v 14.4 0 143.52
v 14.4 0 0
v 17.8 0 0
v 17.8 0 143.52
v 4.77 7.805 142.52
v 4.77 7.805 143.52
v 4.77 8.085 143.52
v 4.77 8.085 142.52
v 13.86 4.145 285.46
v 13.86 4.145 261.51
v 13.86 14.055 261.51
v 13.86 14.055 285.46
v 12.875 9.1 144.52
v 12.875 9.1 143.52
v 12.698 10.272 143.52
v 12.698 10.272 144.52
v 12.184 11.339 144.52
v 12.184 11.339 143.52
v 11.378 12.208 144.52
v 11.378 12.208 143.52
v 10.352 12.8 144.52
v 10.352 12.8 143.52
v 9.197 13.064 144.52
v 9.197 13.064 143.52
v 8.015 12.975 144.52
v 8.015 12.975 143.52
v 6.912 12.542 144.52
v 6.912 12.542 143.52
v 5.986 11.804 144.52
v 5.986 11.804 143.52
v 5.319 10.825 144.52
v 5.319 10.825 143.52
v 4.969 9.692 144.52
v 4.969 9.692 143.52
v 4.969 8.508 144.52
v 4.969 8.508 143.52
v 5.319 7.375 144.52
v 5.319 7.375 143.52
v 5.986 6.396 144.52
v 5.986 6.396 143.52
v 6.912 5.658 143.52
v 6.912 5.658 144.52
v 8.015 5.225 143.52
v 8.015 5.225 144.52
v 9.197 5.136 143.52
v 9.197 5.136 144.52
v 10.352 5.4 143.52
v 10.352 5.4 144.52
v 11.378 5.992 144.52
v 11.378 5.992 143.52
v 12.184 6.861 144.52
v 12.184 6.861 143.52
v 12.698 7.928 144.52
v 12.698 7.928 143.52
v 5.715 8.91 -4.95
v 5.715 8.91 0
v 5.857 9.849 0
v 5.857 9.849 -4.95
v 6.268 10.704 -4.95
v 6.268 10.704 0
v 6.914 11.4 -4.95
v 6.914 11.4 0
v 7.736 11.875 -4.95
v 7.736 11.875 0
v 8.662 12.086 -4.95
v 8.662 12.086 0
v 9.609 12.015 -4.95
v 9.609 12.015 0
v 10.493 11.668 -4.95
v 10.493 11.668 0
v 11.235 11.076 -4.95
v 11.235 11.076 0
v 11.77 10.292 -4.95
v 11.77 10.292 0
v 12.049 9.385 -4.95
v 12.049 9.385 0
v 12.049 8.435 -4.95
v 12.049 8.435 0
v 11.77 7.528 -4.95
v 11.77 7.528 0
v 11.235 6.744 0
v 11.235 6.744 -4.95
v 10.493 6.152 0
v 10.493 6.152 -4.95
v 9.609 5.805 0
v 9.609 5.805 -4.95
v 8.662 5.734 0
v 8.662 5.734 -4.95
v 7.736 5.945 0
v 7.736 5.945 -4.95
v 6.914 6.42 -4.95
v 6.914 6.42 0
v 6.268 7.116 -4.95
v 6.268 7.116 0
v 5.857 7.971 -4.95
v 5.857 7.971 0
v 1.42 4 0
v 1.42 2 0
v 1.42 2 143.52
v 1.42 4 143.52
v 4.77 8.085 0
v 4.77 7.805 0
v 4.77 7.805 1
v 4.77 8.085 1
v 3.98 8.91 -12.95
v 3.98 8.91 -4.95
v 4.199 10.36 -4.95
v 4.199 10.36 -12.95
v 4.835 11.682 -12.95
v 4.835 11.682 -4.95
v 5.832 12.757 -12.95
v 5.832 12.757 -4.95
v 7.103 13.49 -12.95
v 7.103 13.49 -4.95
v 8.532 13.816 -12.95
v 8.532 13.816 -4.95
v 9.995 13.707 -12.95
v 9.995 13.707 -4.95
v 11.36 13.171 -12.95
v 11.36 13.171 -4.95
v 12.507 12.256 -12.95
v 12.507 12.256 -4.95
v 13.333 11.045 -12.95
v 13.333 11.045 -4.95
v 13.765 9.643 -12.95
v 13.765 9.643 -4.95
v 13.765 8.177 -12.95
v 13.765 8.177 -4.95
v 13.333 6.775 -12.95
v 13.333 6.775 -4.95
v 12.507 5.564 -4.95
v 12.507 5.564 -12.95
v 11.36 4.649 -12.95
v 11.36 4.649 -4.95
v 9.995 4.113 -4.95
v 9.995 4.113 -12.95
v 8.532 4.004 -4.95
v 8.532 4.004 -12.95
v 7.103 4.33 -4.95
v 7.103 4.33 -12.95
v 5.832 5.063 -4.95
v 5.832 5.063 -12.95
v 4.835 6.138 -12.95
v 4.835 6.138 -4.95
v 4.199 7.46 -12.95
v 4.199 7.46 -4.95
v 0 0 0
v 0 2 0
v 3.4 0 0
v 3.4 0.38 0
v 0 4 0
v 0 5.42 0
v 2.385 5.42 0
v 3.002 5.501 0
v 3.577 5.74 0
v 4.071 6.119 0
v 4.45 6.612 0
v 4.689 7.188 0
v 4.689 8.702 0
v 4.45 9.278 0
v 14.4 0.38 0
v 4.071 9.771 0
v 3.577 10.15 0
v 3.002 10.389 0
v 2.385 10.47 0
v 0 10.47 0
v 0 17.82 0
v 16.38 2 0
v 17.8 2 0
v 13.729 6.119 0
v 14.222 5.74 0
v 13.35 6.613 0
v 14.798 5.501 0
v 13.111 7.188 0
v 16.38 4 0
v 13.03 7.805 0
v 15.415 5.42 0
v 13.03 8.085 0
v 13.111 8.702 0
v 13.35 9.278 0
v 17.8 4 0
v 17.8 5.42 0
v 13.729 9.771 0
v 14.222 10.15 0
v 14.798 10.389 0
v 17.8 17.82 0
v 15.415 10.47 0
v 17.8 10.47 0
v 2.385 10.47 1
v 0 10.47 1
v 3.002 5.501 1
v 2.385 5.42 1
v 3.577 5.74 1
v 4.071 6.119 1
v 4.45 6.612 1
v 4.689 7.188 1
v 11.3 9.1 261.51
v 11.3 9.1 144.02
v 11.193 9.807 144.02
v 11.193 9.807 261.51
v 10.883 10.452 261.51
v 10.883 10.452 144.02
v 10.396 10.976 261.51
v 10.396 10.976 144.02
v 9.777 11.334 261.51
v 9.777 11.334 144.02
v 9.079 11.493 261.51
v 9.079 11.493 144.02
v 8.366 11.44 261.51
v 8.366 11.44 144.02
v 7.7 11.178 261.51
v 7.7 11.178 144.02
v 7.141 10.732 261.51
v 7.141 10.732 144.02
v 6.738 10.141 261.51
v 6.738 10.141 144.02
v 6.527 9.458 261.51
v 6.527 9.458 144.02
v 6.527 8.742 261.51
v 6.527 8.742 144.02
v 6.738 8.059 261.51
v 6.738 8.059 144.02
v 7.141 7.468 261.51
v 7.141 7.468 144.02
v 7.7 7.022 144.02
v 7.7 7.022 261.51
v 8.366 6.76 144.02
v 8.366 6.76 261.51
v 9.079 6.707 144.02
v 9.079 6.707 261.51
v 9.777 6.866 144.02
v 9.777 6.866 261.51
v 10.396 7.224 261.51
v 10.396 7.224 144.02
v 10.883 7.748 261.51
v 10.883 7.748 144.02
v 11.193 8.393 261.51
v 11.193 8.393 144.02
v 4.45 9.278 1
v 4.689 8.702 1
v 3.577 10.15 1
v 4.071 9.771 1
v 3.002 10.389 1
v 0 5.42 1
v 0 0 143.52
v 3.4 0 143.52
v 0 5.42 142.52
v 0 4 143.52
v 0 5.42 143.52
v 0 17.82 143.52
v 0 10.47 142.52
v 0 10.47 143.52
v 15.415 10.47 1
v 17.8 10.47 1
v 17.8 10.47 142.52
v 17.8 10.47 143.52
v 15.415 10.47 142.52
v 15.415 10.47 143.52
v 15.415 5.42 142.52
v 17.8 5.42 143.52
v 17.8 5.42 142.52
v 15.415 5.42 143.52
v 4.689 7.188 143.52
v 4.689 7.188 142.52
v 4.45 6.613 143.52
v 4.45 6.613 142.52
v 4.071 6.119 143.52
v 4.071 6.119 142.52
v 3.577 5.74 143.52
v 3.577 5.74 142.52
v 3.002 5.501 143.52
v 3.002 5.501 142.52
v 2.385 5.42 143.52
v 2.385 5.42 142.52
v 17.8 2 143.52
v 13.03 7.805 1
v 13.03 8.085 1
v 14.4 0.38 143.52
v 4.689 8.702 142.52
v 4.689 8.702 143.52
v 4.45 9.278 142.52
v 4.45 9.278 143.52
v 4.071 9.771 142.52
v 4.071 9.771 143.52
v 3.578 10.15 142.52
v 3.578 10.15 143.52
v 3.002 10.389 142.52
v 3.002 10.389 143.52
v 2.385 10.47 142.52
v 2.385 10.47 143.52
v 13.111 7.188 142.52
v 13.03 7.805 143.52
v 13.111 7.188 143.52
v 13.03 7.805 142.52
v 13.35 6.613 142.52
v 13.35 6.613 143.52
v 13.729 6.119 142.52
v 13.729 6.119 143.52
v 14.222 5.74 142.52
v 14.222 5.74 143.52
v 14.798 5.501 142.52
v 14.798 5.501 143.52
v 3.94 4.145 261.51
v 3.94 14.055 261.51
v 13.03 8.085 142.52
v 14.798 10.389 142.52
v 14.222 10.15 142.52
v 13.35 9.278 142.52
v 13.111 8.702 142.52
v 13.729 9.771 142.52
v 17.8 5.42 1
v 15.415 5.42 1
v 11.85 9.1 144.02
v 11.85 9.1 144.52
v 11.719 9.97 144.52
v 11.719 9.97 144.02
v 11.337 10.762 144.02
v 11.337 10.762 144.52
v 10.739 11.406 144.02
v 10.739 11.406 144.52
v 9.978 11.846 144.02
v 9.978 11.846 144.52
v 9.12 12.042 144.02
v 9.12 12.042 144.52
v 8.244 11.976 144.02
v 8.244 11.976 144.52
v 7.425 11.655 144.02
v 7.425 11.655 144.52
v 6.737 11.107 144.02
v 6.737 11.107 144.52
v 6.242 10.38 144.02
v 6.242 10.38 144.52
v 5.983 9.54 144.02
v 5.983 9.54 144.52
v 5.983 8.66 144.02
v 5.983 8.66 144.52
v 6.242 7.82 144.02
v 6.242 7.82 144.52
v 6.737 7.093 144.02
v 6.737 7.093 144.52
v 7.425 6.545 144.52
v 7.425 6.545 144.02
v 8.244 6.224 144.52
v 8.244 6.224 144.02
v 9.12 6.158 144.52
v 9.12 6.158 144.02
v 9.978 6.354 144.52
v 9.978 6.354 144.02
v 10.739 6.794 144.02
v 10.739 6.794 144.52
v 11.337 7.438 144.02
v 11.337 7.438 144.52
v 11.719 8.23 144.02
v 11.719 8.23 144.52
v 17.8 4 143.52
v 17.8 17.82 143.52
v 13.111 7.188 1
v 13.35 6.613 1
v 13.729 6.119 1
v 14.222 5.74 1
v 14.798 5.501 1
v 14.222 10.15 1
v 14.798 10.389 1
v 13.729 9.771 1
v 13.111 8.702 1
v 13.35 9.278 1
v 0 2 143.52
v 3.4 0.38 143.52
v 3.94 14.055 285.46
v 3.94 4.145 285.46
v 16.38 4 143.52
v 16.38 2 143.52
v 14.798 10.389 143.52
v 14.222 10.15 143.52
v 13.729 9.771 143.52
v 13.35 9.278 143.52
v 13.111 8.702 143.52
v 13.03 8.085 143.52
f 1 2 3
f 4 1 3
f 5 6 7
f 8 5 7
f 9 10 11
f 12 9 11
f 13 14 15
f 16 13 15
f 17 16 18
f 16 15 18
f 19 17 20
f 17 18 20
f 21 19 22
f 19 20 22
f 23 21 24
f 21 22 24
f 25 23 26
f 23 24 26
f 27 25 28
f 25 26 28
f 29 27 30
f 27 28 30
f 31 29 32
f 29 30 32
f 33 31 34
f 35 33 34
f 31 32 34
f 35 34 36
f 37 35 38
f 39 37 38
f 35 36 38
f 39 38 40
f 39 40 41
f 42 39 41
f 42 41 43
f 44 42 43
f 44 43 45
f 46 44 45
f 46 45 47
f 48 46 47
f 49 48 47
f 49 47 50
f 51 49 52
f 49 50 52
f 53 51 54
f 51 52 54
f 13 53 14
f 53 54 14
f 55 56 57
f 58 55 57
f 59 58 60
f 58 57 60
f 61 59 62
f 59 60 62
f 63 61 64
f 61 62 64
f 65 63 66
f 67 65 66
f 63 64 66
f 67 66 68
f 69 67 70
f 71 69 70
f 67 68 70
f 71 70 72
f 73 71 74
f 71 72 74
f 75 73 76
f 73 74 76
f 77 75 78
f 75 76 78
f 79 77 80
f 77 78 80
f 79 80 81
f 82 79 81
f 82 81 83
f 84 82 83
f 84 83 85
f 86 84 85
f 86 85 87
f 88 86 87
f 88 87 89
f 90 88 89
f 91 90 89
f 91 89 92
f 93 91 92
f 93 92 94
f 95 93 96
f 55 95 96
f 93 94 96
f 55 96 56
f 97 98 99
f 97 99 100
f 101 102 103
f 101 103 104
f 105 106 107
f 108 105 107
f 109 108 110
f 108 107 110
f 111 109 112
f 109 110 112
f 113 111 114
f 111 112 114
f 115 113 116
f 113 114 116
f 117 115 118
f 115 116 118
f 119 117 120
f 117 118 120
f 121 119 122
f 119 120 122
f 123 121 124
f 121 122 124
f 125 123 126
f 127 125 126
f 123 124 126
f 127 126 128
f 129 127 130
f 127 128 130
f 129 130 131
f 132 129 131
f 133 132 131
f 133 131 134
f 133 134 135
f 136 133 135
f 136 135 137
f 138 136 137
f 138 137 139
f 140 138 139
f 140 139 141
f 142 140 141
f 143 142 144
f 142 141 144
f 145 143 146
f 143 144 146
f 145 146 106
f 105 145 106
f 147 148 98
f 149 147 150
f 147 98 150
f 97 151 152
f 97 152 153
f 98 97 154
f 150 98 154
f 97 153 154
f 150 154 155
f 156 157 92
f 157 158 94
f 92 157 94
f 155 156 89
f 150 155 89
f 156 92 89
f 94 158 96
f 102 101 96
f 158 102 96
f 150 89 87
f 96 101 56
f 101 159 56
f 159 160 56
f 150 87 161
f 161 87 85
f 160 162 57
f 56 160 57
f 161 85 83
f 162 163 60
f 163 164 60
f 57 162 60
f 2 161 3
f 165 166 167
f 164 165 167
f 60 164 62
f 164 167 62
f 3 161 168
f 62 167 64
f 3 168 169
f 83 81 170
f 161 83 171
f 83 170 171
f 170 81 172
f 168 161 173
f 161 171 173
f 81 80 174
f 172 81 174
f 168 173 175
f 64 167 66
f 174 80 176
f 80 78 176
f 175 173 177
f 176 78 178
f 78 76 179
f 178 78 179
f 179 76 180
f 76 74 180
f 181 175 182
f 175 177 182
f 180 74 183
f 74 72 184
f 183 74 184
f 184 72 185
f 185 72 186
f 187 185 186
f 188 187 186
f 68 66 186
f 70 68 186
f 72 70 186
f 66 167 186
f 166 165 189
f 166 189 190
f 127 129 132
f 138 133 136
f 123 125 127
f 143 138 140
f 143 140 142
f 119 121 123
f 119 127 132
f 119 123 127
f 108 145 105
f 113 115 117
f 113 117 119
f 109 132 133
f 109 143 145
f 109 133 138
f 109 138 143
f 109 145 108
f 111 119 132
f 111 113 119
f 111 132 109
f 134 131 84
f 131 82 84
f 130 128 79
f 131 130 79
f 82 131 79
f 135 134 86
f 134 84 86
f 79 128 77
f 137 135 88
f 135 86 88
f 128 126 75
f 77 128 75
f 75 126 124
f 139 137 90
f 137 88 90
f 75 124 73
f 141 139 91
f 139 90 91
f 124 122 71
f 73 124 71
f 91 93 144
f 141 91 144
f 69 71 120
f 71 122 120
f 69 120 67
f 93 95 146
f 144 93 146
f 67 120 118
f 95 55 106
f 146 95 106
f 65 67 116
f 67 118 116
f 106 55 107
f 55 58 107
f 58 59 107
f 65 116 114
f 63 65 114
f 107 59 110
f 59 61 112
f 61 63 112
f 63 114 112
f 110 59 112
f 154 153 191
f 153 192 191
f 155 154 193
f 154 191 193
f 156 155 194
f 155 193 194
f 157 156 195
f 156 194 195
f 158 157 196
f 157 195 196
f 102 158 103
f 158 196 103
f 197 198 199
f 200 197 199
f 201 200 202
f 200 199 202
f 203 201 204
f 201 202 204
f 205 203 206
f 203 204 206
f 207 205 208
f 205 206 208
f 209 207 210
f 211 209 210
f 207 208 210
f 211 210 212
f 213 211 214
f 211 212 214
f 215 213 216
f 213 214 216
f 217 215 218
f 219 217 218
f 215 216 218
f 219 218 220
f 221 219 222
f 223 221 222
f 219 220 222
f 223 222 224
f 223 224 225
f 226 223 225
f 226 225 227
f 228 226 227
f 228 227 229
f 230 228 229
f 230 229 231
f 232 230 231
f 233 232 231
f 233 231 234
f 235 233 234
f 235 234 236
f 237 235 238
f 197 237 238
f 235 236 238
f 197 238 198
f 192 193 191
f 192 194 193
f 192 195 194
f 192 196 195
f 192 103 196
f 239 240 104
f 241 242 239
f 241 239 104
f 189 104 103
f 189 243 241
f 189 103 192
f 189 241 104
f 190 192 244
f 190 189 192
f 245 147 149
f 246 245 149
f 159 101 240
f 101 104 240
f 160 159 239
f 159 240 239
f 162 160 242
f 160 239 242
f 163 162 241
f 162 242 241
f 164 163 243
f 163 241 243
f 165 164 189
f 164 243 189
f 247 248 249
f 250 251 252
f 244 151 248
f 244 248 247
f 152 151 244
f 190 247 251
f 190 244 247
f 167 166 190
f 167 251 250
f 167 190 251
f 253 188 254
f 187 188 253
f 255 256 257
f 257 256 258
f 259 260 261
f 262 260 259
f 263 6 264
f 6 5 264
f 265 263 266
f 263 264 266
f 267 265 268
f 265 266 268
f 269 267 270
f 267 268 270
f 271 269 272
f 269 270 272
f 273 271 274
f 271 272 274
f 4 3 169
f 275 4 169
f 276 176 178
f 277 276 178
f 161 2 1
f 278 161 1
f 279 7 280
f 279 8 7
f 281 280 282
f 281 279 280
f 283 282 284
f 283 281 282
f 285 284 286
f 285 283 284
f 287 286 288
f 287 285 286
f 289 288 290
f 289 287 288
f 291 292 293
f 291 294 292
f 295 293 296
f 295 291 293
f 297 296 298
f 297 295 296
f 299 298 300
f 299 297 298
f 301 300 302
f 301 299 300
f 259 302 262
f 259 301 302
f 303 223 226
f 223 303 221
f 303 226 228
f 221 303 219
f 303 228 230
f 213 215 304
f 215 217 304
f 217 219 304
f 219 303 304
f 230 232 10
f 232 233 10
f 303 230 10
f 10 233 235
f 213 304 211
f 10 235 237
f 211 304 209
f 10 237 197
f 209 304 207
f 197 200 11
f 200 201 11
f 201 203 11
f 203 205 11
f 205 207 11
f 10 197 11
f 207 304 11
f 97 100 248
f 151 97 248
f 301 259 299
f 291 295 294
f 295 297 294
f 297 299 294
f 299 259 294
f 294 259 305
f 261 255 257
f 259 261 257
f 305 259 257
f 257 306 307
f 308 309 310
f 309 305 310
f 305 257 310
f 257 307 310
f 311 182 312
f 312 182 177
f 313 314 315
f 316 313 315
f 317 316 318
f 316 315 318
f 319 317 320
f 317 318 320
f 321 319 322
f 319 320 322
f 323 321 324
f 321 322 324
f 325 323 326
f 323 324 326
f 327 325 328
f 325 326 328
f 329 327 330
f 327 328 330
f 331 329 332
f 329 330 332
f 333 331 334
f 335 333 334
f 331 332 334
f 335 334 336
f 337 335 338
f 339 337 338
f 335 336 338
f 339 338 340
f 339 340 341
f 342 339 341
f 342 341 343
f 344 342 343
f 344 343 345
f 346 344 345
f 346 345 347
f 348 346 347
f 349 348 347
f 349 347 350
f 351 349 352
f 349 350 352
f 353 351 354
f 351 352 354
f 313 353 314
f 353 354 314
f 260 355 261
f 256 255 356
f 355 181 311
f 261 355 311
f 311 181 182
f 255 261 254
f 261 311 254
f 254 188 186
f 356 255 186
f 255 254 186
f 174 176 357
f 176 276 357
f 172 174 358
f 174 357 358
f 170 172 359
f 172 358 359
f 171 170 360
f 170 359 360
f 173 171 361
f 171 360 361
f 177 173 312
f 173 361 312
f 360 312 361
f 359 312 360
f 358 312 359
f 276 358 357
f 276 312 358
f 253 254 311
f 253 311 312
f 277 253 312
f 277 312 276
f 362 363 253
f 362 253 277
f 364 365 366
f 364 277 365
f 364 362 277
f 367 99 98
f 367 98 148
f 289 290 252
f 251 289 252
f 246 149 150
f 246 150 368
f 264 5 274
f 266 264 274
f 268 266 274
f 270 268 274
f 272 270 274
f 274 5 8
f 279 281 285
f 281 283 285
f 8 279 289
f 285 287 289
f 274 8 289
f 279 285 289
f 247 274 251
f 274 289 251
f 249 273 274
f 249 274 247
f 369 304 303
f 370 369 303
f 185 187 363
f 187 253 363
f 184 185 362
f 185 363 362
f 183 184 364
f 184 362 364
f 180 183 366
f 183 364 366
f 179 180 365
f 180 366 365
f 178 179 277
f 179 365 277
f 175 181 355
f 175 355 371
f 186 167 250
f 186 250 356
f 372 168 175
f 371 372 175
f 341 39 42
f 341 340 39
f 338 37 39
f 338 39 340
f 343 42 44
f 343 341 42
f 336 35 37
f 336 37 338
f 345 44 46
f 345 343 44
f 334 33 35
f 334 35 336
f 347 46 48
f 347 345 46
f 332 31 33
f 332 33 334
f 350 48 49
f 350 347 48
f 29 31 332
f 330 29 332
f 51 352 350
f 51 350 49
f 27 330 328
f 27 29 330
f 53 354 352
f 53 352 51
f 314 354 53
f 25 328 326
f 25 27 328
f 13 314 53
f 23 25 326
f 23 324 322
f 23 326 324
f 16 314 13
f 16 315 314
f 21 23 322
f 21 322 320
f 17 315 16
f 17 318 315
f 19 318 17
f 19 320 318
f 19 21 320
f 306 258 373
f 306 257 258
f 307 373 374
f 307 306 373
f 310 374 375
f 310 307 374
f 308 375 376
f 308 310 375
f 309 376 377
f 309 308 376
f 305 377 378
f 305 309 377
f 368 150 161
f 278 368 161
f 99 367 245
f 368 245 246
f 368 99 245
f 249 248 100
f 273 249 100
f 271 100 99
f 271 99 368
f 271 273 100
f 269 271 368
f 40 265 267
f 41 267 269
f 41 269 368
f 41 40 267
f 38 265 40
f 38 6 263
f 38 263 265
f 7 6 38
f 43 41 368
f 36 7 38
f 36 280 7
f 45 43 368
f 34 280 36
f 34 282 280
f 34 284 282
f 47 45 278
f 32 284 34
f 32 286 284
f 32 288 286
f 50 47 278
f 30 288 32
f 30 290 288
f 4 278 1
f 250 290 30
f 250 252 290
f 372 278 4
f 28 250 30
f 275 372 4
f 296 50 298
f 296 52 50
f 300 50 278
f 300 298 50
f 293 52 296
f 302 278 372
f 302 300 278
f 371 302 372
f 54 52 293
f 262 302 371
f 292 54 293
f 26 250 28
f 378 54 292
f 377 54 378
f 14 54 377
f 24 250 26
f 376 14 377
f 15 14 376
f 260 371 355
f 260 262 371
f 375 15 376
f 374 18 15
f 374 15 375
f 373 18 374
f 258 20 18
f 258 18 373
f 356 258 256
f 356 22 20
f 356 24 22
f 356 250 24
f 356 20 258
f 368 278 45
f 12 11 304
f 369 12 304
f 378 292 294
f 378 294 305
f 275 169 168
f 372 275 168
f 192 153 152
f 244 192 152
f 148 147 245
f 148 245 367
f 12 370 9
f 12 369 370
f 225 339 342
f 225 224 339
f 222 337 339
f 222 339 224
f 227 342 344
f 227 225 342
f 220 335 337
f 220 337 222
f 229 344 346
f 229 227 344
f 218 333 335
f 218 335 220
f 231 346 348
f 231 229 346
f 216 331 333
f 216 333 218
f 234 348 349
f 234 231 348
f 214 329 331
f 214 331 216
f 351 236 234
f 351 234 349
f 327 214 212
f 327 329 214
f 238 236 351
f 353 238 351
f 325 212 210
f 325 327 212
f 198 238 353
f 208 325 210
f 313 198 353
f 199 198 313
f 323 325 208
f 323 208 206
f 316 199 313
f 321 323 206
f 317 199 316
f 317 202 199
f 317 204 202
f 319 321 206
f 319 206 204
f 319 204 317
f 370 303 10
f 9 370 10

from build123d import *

# Parameters (mm, degrees)
CROQUIS1_W              = 17.8
CROQUIS1_H              = 17.82
SALIENTE_EXTRUIR1_DEPTH = 143.52
CROQUIS2_W              = 11
CROQUIS2_H              = 143.52
CORTAR_EXTRUIR1_DEPTH   = 0.38
CROQUIS3_W              = 1.42
CROQUIS3_H              = 2
CORTAR_EXTRUIR2_DEPTH   = 144.52
CROQUIS4_W              = 4.77
CROQUIS4_H              = 5.05
CORTAR_EXTRUIR3_DEPTH   = 1
CORTAR_EXTRUIR4_START   = -142.52
CROQUIS5_W              = 4.77
CROQUIS5_H              = 5.05
CORTAR_EXTRUIR4_DEPTH   = 1
REDONDEO1_R             = 2.385
REDONDEO2_R             = 2.385
REDONDEO3_R             = 2.385
REDONDEO4_R             = 2.385
REDONDEO5_R             = 2.385
REDONDEO6_R             = 2.385
REDONDEO7_R             = 2.385
REDONDEO8_R             = 2.385
CROQUIS6_R              = 3.975
SALIENTE_EXTRUIR2_DEPTH = 1
CROQUIS7_R              = 2.95
CORTAR_EXTRUIR5_DEPTH   = 0.5
CROQUIS8_R              = 2.4
SALIENTE_EXTRUIR3_DEPTH = 117.49
SALIENTE_EXTRUIR4_DEPTH = 23.95
CROQUIS10_R             = 3.185
SALIENTE_EXTRUIR5_DEPTH = 4.95
CROQUIS15_R             = 4.92
SALIENTE_EXTRUIR6_DEPTH = 8


with BuildPart() as part:
    # Croquis1 → Saliente-Extruir1 (new body)
    with BuildSketch(Plane.XY):
        with Locations((8.9, 8.91)):
            Rectangle(CROQUIS1_W, CROQUIS1_H)
    extrude(amount=SALIENTE_EXTRUIR1_DEPTH)

    # Croquis2 → Cortar-Extruir1 (cut)
    with BuildSketch(Plane.XZ):
        with Locations((8.9, 71.76)):
            Rectangle(CROQUIS2_W, CROQUIS2_H)
    extrude(amount=-CORTAR_EXTRUIR1_DEPTH, mode=Mode.SUBTRACT)

    # Croquis3 → Cortar-Extruir2 (cut, through all)
    with BuildSketch(Plane(origin=(0, 0, 0), x_dir=(-1, 0, 0), z_dir=(0, 0, -1))):
        with Locations((-17.09, 3)):
            Rectangle(CROQUIS3_W, CROQUIS3_H)
        with Locations((-0.71, 3)):
            Rectangle(CROQUIS3_W, CROQUIS3_H)
    extrude(amount=-CORTAR_EXTRUIR2_DEPTH, mode=Mode.SUBTRACT)

    # Croquis4 → Cortar-Extruir3 (cut)
    with BuildSketch(Plane(origin=(0, 0, 0), x_dir=(-1, 0, 0), z_dir=(0, 0, -1))):
        with Locations((-2.385, 7.945)):
            Rectangle(CROQUIS4_W, CROQUIS4_H)
        with Locations((-15.415, 7.945)):
            Rectangle(CROQUIS4_W, CROQUIS4_H)
    extrude(amount=-CORTAR_EXTRUIR3_DEPTH, mode=Mode.SUBTRACT)

    # Croquis5 → Cortar-Extruir4 (cut)
    with BuildSketch(Plane(origin=(0, 0, 1), x_dir=(-1, 0, 0), z_dir=(0, 0, -1)).offset(CORTAR_EXTRUIR4_START)):
        with Locations((-15.415, 7.945)):
            Rectangle(CROQUIS5_W, CROQUIS5_H)
        with Locations((-2.385, 7.945)):
            Rectangle(CROQUIS5_W, CROQUIS5_H)
    extrude(amount=CORTAR_EXTRUIR4_DEPTH, mode=Mode.SUBTRACT)

    # Redondeo1
    redondeo1_edges = [part.edges().sort_by_distance(p)[0] for p in [
        (4.77, 5.42, 0.5),
    ]]
    fillet(redondeo1_edges, radius=REDONDEO1_R)

    # Redondeo2
    redondeo2_edges = [part.edges().sort_by_distance(p)[0] for p in [
        (4.77, 10.47, 0.5),
    ]]
    fillet(redondeo2_edges, radius=REDONDEO2_R)

    # Redondeo3
    redondeo3_edges = [part.edges().sort_by_distance(p)[0] for p in [
        (13.03, 10.47, 0.5),
    ]]
    fillet(redondeo3_edges, radius=REDONDEO3_R)

    # Redondeo4
    redondeo4_edges = [part.edges().sort_by_distance(p)[0] for p in [
        (13.03, 5.42, 0.5),
    ]]
    fillet(redondeo4_edges, radius=REDONDEO4_R)

    # Redondeo5
    redondeo5_edges = [part.edges().sort_by_distance(p)[0] for p in [
        (13.03, 10.47, 143.02),
    ]]
    fillet(redondeo5_edges, radius=REDONDEO5_R)

    # Redondeo6
    redondeo6_edges = [part.edges().sort_by_distance(p)[0] for p in [
        (13.03, 5.42, 143.02),
    ]]
    fillet(redondeo6_edges, radius=REDONDEO6_R)

    # Redondeo7
    redondeo7_edges = [part.edges().sort_by_distance(p)[0] for p in [
        (4.77, 5.42, 143.02),
    ]]
    fillet(redondeo7_edges, radius=REDONDEO7_R)

    # Redondeo8
    redondeo8_edges = [part.edges().sort_by_distance(p)[0] for p in [
        (4.77, 10.47, 143.02),
    ]]
    fillet(redondeo8_edges, radius=REDONDEO8_R)

    # Croquis6 → Saliente-Extruir2 (add)
    with BuildSketch(Plane.XY.offset(143.52)):
        with Locations((8.9, 9.1)):
            Circle(CROQUIS6_R)
    extrude(amount=SALIENTE_EXTRUIR2_DEPTH)

    # Croquis7 → Cortar-Extruir5 (cut)
    with BuildSketch(Plane.XY.offset(144.52)):
        with Locations((8.9, 9.1)):
            Circle(CROQUIS7_R)
    extrude(amount=-CORTAR_EXTRUIR5_DEPTH, mode=Mode.SUBTRACT)

    # Croquis8 → Saliente-Extruir3 (add)
    with BuildSketch(Plane.XY.offset(144.02)):
        with Locations((8.9, 9.1)):
            Circle(CROQUIS8_R)
    extrude(amount=SALIENTE_EXTRUIR3_DEPTH)

    # Croquis9 → Saliente-Extruir4 (add)
    with BuildSketch(Plane.XY.offset(261.51)):
        with BuildLine():
            Line((3.94, 4.145), (8.9, 4.145))
            Line((8.9, 4.145), (8.9, 6.7))
            ThreePointArc((8.9, 6.7), (6.5, 9.1), (8.9, 11.5))
            Line((8.9, 11.5), (8.9, 14.055))
            Line((8.9, 14.055), (3.94, 14.055))
            Line((3.94, 14.055), (3.94, 4.145))
        make_face()
        with BuildLine():
            Line((8.9, 6.7), (8.9, 4.145))
            Line((8.9, 4.145), (13.86, 4.145))
            Line((13.86, 4.145), (13.86, 14.055))
            Line((13.86, 14.055), (8.9, 14.055))
            Line((8.9, 14.055), (8.9, 11.5))
            ThreePointArc((8.9, 11.5), (10.597056275, 10.797056275), (11.3, 9.1))
            ThreePointArc((11.3, 9.1), (10.597056275, 7.402943725), (8.9, 6.7))
        make_face()
        with BuildLine():
            ThreePointArc((8.9, 11.5), (6.5, 9.1), (8.9, 6.7))
            Line((8.9, 6.7), (8.9, 11.5))
        make_face()
        with BuildLine():
            Line((8.9, 11.5), (8.9, 6.7))
            ThreePointArc((8.9, 6.7), (10.597056275, 7.402943725), (11.3, 9.1))
            ThreePointArc((11.3, 9.1), (10.597056275, 10.797056275), (8.9, 11.5))
        make_face()
    extrude(amount=SALIENTE_EXTRUIR4_DEPTH)

    # Croquis10 → Saliente-Extruir5 (add)
    with BuildSketch(Plane(origin=(0, 0, 0), x_dir=(-1, 0, 0), z_dir=(0, 0, -1))):
        with Locations((-8.9, 8.91)):
            Circle(CROQUIS10_R)
    extrude(amount=SALIENTE_EXTRUIR5_DEPTH)

    # Croquis15 → Saliente-Extruir6 (add)
    with BuildSketch(Plane(origin=(0, 0, -4.95), x_dir=(-1, 0, 0), z_dir=(0, 0, -1))):
        with Locations((-8.9, 8.91)):
            Circle(CROQUIS15_R)
    extrude(amount=SALIENTE_EXTRUIR6_DEPTH)


solid = part.part
